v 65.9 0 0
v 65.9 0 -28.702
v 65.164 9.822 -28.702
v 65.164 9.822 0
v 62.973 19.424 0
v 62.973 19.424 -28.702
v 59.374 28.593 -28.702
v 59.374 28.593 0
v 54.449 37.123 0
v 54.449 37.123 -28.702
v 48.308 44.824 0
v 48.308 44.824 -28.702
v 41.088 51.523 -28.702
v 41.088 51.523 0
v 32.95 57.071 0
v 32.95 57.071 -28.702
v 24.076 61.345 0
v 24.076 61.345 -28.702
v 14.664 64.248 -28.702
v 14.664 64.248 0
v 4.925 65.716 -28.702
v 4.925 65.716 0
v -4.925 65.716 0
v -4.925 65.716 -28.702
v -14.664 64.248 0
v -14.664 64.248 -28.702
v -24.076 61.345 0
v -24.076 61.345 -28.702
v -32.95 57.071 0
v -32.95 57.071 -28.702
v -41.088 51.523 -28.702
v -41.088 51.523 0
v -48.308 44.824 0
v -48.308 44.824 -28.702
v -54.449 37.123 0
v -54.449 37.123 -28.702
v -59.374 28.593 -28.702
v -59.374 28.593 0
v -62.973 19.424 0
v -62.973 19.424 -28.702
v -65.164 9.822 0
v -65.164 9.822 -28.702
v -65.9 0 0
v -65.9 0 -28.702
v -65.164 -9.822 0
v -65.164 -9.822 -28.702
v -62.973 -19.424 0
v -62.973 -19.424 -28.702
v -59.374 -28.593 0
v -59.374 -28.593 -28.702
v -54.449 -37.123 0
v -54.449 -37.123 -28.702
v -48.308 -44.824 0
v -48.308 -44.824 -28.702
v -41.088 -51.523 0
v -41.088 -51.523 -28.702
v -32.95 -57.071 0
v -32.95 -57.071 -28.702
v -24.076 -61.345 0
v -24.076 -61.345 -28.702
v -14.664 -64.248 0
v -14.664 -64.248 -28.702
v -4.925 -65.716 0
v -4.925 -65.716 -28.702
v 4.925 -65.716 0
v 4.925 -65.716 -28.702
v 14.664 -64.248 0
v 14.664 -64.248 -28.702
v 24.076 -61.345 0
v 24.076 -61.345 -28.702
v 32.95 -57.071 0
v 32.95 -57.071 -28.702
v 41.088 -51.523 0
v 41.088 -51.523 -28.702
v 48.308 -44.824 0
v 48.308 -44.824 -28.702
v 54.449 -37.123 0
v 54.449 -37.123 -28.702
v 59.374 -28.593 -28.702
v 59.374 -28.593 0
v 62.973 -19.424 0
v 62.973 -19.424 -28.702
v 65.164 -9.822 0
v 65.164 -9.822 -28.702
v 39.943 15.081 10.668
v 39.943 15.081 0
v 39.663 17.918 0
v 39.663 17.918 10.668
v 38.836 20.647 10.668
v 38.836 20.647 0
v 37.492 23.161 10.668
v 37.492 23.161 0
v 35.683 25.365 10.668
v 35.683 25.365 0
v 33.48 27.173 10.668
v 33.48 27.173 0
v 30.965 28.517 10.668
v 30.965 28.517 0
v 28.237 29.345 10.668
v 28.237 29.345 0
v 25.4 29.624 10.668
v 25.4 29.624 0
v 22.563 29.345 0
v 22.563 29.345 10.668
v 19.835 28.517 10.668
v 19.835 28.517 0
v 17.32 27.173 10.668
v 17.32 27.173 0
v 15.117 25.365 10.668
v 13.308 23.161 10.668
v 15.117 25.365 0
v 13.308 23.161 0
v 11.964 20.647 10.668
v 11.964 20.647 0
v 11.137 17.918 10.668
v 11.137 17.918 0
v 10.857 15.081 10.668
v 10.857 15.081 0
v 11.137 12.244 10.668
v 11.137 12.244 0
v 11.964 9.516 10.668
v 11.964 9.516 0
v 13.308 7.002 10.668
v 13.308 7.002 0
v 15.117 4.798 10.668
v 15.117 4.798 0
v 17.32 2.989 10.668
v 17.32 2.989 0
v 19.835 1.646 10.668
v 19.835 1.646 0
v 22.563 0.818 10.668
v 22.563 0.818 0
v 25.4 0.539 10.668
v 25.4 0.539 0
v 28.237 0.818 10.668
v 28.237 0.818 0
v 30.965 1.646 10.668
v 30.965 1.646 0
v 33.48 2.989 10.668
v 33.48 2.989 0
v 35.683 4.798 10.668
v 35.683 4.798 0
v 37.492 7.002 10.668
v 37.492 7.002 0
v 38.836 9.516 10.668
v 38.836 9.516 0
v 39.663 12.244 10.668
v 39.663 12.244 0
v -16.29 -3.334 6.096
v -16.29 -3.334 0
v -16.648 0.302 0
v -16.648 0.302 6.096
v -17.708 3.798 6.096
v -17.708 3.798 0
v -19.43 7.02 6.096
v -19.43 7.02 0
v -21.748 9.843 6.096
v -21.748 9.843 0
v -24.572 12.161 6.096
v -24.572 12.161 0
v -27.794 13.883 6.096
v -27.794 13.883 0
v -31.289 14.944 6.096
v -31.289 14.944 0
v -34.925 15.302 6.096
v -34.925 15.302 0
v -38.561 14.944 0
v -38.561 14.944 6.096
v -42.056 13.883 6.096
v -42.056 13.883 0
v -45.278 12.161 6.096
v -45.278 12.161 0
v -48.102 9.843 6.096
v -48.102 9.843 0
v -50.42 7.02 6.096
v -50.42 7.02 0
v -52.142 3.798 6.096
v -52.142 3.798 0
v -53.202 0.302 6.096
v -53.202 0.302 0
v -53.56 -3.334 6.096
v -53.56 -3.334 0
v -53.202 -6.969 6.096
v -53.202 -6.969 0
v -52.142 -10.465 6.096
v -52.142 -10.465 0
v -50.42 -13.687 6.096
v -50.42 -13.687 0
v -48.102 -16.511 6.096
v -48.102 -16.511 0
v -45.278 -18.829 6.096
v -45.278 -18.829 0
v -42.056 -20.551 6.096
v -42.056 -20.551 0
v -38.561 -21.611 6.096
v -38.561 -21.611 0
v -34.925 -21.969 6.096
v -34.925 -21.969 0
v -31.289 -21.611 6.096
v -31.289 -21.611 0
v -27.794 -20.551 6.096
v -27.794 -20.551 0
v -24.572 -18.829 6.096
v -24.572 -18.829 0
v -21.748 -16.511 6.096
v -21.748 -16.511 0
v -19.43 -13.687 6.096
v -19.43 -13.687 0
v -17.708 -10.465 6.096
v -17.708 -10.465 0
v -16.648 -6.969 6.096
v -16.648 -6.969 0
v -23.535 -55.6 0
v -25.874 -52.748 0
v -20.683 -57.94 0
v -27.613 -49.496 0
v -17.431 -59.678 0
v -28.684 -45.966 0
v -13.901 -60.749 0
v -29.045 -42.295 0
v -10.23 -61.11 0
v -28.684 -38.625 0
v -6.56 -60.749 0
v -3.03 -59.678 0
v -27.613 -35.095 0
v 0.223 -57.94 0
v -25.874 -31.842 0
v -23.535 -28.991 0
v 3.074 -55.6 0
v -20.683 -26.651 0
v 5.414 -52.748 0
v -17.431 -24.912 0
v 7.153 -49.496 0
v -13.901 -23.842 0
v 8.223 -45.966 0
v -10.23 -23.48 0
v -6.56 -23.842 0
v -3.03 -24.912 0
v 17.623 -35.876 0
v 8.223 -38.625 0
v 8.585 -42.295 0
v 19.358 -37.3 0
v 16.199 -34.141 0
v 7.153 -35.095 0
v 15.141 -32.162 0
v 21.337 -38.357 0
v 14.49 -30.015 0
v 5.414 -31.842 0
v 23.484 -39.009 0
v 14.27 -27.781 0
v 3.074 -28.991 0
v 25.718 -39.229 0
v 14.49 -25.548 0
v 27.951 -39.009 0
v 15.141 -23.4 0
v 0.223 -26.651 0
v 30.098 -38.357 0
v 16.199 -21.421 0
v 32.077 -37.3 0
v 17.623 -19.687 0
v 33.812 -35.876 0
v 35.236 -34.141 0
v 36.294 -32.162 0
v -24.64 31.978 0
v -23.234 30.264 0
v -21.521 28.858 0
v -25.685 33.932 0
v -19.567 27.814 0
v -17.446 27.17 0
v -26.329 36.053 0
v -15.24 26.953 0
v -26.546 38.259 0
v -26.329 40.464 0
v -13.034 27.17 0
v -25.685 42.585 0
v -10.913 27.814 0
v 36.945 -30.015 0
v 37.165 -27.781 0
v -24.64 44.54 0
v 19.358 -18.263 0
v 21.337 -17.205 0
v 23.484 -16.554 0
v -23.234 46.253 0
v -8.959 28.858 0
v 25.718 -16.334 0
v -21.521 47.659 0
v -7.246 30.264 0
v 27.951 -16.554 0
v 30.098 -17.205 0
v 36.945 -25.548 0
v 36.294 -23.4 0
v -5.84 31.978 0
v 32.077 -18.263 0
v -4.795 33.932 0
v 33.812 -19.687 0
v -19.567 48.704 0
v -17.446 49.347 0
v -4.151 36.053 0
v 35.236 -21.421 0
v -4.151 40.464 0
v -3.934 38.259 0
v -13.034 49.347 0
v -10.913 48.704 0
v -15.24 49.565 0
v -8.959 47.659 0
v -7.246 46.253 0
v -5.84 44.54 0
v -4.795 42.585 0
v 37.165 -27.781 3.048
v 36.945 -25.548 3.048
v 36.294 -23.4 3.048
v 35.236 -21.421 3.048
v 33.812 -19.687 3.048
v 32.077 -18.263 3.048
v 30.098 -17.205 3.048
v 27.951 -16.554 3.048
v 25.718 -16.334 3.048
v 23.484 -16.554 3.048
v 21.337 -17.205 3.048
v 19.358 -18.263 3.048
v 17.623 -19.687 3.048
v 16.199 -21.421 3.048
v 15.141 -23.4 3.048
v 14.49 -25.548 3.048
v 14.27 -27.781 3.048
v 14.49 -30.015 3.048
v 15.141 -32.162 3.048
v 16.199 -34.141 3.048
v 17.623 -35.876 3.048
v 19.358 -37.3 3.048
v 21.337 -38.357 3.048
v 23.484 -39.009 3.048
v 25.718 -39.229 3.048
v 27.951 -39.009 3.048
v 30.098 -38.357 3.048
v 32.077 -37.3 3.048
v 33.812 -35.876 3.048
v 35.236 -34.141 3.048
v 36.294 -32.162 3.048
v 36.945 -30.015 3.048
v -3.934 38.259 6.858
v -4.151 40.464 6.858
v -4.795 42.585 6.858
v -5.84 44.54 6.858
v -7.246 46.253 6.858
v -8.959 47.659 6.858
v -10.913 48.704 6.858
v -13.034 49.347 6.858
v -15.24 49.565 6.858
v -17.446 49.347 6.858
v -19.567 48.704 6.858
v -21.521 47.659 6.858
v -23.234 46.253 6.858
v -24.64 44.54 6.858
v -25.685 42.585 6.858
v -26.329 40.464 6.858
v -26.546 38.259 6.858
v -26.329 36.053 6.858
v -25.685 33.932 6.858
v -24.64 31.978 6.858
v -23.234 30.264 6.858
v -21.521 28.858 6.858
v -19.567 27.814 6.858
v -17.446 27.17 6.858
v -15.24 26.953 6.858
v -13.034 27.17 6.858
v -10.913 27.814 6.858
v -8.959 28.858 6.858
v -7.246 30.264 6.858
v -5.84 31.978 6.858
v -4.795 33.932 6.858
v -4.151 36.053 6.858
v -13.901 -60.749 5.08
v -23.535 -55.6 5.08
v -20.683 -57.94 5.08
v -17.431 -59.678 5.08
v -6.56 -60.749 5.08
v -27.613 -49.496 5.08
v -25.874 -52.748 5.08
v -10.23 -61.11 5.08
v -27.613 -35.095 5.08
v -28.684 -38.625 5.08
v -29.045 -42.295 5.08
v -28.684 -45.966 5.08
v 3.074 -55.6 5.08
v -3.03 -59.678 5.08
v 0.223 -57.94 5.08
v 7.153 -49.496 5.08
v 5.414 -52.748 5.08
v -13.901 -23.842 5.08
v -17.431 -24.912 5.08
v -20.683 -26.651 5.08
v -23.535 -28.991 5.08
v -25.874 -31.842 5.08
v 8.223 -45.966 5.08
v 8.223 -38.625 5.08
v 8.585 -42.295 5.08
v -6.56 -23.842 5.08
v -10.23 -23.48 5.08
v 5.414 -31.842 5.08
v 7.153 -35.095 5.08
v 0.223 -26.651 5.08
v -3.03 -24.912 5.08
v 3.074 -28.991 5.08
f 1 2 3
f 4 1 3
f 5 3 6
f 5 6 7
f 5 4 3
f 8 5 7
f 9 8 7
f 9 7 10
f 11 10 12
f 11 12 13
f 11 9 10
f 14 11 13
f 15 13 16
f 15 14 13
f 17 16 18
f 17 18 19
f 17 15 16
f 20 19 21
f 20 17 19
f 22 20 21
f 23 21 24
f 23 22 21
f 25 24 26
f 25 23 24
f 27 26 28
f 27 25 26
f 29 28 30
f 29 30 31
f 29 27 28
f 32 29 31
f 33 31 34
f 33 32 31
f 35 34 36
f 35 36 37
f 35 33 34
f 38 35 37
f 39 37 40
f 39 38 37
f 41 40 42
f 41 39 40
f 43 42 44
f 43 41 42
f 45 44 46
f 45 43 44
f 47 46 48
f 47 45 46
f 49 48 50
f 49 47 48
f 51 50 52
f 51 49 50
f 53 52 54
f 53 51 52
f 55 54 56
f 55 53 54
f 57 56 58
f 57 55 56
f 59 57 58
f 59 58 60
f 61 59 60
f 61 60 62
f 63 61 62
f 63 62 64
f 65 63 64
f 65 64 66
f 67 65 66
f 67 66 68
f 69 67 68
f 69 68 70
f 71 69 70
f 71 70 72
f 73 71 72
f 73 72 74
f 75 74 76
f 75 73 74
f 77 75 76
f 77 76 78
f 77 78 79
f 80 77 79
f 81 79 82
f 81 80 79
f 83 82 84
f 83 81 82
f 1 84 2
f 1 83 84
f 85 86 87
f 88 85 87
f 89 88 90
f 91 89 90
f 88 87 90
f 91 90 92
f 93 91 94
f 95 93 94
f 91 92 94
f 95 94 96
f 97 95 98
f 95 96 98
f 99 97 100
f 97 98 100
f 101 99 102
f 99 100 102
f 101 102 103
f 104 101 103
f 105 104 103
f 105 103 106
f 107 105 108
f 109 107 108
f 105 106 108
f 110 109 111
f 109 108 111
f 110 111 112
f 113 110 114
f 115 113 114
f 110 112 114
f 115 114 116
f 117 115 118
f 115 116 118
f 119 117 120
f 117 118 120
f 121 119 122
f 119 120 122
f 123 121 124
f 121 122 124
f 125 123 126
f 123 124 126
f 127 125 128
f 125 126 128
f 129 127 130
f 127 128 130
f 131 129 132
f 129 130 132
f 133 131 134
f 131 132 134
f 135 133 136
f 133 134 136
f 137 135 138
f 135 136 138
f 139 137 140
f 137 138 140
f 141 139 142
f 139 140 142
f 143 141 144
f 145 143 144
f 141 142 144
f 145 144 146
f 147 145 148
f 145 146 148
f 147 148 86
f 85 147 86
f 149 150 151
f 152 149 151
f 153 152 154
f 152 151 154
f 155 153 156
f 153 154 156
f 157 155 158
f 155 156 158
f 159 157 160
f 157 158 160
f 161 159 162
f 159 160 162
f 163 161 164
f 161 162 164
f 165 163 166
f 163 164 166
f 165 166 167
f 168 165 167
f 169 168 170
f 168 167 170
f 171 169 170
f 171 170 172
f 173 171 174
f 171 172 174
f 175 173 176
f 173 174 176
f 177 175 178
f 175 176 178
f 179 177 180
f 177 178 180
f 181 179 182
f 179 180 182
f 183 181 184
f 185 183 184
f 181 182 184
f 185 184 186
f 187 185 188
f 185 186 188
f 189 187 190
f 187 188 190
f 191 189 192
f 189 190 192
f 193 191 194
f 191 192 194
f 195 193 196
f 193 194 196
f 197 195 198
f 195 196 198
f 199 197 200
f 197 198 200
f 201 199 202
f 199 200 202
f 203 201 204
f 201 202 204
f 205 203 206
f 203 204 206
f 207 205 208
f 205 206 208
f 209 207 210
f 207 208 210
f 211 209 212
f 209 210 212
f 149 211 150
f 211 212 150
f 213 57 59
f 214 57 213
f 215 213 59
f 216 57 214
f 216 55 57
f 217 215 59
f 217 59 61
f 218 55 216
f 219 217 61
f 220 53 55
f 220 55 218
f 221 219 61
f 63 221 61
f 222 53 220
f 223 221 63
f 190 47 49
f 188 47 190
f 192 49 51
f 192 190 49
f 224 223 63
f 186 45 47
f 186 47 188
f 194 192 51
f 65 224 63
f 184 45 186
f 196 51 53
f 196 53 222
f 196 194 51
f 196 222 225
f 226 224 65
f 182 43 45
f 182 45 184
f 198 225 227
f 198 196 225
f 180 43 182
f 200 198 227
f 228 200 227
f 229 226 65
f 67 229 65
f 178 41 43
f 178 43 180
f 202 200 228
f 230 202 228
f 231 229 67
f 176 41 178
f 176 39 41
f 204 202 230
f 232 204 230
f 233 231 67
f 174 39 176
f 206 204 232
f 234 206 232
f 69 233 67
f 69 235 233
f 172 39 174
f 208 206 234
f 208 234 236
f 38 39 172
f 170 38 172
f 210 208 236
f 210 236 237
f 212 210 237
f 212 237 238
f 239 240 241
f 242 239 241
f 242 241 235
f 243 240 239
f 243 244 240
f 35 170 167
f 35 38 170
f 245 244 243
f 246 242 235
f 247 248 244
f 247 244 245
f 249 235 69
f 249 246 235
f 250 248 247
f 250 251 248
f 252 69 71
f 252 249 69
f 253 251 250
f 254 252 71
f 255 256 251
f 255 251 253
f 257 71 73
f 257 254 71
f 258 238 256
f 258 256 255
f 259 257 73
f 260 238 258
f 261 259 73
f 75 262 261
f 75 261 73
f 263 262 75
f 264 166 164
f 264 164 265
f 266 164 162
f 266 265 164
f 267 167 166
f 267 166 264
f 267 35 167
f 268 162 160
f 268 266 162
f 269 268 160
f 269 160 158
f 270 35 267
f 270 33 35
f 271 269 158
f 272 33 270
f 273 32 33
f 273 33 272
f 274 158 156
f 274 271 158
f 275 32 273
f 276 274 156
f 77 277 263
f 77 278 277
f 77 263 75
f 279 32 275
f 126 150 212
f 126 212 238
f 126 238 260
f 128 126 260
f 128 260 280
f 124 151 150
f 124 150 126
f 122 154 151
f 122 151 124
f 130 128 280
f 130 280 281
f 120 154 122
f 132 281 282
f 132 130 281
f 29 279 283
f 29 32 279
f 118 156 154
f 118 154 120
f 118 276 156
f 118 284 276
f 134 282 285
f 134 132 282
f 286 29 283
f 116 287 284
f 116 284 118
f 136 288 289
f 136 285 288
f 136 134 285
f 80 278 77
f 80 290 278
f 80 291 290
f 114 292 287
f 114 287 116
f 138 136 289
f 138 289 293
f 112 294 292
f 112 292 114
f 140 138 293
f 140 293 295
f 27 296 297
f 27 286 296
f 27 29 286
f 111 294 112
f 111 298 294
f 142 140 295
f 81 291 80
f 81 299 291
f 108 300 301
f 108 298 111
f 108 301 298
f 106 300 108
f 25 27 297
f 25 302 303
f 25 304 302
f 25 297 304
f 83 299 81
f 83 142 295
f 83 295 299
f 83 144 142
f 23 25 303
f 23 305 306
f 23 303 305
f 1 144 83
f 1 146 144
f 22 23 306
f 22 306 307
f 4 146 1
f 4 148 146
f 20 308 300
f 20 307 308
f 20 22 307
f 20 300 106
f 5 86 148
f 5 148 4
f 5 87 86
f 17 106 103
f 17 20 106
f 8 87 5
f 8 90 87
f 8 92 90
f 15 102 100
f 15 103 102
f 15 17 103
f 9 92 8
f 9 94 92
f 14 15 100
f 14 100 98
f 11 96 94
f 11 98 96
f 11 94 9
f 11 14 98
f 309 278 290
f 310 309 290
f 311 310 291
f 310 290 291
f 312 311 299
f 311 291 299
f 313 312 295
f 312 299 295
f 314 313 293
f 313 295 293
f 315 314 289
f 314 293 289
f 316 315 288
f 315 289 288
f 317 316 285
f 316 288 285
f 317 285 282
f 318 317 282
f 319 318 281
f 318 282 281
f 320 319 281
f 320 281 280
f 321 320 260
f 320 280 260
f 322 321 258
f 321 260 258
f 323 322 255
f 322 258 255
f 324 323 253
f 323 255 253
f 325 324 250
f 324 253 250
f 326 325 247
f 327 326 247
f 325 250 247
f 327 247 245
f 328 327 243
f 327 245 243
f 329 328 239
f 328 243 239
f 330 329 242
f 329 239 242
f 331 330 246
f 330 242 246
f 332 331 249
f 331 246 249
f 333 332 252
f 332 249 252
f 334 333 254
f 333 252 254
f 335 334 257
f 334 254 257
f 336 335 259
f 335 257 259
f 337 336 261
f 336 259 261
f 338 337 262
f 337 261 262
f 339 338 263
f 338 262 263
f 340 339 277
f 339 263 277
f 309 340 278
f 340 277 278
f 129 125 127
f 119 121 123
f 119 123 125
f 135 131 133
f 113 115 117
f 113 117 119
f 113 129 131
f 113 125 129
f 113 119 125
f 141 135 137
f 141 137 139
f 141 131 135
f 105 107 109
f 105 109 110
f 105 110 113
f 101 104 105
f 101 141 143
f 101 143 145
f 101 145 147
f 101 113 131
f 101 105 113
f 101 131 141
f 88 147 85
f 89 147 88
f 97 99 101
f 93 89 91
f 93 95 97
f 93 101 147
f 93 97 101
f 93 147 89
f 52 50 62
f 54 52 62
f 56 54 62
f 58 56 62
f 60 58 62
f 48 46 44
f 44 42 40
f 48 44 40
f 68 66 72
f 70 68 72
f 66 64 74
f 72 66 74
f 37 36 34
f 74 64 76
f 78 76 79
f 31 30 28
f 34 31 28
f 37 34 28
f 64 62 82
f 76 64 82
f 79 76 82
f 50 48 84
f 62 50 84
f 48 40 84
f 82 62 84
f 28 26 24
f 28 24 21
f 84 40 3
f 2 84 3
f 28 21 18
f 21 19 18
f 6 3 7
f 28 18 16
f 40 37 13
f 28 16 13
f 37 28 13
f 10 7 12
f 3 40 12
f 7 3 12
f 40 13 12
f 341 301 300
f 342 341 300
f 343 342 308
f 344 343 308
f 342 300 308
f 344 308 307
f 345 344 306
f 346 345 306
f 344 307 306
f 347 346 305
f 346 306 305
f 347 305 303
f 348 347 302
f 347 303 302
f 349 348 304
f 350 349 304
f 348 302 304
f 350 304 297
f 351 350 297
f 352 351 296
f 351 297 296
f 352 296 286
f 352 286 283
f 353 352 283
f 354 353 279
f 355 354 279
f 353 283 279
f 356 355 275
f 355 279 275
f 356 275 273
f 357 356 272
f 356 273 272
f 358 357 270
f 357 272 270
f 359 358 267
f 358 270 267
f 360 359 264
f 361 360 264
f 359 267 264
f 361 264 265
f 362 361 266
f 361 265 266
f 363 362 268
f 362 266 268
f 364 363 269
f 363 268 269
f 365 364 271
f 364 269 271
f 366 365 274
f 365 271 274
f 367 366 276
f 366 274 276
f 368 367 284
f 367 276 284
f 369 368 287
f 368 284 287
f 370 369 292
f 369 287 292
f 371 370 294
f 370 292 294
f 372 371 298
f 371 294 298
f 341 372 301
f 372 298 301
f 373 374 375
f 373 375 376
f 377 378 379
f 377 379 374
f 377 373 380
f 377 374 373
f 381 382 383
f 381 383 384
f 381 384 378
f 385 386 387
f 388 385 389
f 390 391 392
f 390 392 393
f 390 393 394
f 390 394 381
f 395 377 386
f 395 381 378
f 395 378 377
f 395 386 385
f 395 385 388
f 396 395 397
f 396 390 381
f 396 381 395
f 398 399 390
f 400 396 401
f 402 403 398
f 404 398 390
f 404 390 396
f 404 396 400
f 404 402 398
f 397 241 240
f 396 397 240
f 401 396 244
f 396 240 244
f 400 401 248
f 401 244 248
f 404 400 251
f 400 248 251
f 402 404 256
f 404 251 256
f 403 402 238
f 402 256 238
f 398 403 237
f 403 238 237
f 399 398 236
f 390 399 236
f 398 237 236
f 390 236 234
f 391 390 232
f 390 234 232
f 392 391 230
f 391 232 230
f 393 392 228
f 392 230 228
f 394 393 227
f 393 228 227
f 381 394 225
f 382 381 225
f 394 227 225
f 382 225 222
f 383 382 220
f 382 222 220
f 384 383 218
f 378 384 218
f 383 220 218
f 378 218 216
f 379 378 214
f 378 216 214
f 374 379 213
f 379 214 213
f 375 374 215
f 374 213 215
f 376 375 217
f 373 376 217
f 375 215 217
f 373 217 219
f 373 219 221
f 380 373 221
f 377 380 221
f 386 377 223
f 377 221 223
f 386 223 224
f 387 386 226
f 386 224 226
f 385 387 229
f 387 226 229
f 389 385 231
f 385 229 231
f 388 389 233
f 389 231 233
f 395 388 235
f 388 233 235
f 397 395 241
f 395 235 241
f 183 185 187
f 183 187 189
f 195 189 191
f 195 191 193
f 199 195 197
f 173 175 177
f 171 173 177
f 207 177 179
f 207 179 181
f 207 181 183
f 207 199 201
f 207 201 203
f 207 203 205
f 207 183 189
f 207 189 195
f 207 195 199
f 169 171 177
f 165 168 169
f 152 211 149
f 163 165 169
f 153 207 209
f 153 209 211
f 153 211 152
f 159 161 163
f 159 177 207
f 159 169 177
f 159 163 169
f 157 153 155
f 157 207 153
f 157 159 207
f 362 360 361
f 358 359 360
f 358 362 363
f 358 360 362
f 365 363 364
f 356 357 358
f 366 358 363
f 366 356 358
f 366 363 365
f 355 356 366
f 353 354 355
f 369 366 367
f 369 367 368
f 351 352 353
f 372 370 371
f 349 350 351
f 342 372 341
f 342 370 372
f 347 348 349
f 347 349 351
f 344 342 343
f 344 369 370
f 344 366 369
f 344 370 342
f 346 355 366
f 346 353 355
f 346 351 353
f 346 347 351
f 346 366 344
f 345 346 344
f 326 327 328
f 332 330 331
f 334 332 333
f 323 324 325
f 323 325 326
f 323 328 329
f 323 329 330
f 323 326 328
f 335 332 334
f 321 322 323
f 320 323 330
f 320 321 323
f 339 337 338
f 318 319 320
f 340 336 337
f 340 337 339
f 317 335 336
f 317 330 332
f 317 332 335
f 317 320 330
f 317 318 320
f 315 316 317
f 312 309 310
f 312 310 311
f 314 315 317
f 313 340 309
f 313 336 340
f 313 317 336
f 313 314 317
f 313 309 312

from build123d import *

# Parameters (mm, degrees)
F0_R      = 65.900375
F1_DEPTH  = 28.702
F2_R      = 11.305854
F3_DEPTH  = 6.858
F4_R      = 18.635384
F5_DEPTH  = 6.096
F6_R      = 14.542748
F7_DEPTH  = 10.668
F8_R      = 11.447627
F9_DEPTH  = 3.048
F10_R     = 18.815081
F11_DEPTH = 5.08


with BuildPart() as f1:
    # F0 (on Top) → F1 (new body)
    with BuildSketch(Plane.XY):
        Circle(F0_R)
    extrude(amount=-F1_DEPTH)

    # F2 (on Top) → F3 (join)
    with BuildSketch(Plane.XY):
        with Locations((-15.24, 38.25875)):
            Circle(F2_R)
    extrude(amount=F3_DEPTH)

    # F4 (on Top) → F5 (join)
    with BuildSketch(Plane.XY):
        with Locations((-34.924999, -3.33375)):
            Circle(F4_R)
    extrude(amount=F5_DEPTH)

    # F6 (on Top) → F7 (join)
    with BuildSketch(Plane.XY):
        with Locations((25.400002, 15.08125)):
            Circle(F6_R)
    extrude(amount=F7_DEPTH)

    # F8 (on Top) → F9 (join)
    with BuildSketch(Plane.XY):
        with Locations((25.717501, -27.78125)):
            Circle(F8_R)
    extrude(amount=F9_DEPTH)

    # F10 (on Top) → F11 (join)
    with BuildSketch(Plane.XY):
        with Locations((-10.230287, -42.295363)):
            Circle(F10_R)
    extrude(amount=F11_DEPTH)


solid = f1.part
